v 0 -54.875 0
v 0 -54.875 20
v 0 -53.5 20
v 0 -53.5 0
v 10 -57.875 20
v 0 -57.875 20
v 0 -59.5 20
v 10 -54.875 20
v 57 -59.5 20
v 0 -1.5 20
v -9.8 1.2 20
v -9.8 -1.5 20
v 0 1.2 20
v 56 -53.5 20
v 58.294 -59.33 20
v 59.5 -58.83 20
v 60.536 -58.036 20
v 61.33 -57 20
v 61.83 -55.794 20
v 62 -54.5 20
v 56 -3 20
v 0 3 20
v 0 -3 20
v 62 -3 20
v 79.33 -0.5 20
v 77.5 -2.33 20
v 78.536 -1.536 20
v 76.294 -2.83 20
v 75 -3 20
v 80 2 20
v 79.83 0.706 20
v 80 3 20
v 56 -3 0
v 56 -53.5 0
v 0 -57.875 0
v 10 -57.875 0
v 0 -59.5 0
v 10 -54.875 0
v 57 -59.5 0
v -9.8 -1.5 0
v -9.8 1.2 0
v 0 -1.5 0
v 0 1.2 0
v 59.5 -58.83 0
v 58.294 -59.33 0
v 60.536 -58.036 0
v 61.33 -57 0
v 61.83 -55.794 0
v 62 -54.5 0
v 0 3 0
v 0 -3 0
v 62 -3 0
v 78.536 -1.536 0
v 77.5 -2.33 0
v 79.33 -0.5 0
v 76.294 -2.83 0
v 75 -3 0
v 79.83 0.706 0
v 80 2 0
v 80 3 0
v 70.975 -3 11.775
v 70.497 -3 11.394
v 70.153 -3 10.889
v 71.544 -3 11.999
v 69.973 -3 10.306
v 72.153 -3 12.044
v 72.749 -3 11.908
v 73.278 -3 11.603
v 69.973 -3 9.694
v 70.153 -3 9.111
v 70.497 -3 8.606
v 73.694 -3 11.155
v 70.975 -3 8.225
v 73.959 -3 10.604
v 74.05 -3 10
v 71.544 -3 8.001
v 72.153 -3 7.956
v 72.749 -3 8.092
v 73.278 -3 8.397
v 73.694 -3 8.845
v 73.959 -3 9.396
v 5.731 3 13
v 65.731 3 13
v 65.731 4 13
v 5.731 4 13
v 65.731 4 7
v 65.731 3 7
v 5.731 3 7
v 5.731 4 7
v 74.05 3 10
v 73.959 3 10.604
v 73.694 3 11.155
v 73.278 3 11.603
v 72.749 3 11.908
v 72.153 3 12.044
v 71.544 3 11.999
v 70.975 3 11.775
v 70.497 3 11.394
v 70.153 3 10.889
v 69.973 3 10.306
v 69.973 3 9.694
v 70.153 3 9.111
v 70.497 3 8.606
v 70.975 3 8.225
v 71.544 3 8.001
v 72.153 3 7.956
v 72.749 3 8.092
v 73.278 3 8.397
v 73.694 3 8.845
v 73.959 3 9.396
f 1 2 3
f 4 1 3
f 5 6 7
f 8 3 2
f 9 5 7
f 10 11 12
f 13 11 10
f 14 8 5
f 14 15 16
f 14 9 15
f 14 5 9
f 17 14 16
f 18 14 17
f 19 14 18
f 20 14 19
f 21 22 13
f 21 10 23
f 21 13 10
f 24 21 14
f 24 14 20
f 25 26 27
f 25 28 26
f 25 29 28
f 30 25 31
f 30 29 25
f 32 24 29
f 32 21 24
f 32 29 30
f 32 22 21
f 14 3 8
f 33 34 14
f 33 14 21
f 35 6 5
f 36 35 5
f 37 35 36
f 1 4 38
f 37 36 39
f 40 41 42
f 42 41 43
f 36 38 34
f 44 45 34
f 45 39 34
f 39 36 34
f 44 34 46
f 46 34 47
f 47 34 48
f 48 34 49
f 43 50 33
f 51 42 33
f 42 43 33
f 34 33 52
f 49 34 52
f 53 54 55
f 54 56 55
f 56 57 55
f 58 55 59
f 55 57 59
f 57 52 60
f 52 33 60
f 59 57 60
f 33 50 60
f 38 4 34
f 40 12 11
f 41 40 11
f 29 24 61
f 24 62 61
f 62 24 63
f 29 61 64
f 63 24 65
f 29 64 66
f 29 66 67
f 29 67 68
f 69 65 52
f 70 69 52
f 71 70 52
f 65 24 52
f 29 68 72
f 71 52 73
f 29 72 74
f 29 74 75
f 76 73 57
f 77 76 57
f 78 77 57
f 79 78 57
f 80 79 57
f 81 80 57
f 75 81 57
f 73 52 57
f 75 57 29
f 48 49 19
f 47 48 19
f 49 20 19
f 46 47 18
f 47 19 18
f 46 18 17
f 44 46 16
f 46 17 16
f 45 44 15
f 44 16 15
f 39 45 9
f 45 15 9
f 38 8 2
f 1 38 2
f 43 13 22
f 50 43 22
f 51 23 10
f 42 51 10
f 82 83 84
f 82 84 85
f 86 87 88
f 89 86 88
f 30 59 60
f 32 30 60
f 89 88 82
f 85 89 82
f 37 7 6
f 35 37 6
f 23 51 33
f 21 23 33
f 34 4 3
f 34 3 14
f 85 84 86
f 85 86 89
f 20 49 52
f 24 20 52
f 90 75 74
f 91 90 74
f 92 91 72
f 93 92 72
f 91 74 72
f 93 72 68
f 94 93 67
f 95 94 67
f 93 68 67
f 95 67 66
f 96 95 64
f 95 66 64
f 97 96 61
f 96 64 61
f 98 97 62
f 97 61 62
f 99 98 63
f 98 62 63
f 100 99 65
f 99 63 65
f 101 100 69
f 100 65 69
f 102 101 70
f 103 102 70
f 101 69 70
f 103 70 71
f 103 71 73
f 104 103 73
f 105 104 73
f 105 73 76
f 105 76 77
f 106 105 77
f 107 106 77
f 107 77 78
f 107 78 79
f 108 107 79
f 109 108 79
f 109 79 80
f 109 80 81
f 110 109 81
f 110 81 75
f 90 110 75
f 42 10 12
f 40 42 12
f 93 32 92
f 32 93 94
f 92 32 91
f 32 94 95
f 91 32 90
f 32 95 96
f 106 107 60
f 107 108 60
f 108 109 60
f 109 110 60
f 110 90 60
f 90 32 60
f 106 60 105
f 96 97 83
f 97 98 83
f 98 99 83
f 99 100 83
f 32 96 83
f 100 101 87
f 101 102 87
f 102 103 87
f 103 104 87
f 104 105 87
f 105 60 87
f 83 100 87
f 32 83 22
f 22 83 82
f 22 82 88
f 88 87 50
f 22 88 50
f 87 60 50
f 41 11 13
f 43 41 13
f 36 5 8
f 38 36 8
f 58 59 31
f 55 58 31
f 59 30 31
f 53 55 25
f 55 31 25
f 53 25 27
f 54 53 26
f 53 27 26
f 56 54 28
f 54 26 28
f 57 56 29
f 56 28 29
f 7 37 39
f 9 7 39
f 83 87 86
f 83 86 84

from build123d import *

# Parameters (mm, degrees)
F0_W     = 112
F0_H     = 50.5
F1_DEPTH = 20
F2_R     = 5
F4_D     = 4.1
F6_DEPTH = 20
F7_W     = 60
F7_H     = 6
F8_DEPTH = 1


with BuildPart() as f1:
    # F0 (on Top) → F1 (new body)
    with BuildSketch(Plane.XY):
        Polygon((80, 3), (-80, 3), (-80, -3), (-62, -3), (-62, -59.5), (62, -59.5), (62, -3), (80, -3), align=None)
        with Locations((0, -28.25)):
            Rectangle(F0_W, F0_H, mode=Mode.SUBTRACT)
    extrude(amount=F1_DEPTH)

    # F2
    f2_edges = [f1.edges().sort_by_distance(p)[0] for p in [
        (62, -59.5, 10),
        (-62, -59.5, 10),
        (-80, -3, 10),
        (80, -3, 10),
    ]]
    fillet(f2_edges, radius=F2_R)

    # F4 (through all)
    with Locations(Plane(origin=(0, 3, 0), x_dir=(-1, 0, 0), z_dir=(0, 1, 0))):
        with Locations((-72, 10), (72, 10)):
            Hole(F4_D / 2)

    # F5 (on face) → F6 (cut, through all)
    with BuildSketch(Plane.XY.offset(20)):
        with BuildLine():
            Line((10, -57.87533), (10, -54.87533))
            Line((10, -54.87533), (0, -54.87533))
            Line((0, -54.87533), (0, -53.5))
            Line((0, -53.5), (-56, -53.5))
            Line((-56, -53.5), (-56, -3))
            Line((-56, -3), (0, -3))
            Line((0, -3), (0, -1.5))
            Line((0, -1.5), (-9.8, -1.5))
            Line((-9.8, -1.5), (-9.8, 1.2))
            Line((-9.8, 1.2), (0, 1.2))
            Line((0, 1.2), (0, 3))
            Line((0, 3), (-80, 3))
            Line((-80, 3), (-80, 2))
            ThreePointArc((-80, 2), (-78.535534, -1.535534), (-75, -3))
            Line((-75, -3), (-62, -3))
            Line((-62, -3), (-62, -54.5))
            ThreePointArc((-62, -54.5), (-60.535534, -58.035534), (-57, -59.5))
            Line((-57, -59.5), (0, -59.5))
            Line((0, -59.5), (0, -57.87533))
            Line((0, -57.87533), (10, -57.87533))
        make_face()
    extrude(amount=-F6_DEPTH, mode=Mode.SUBTRACT)

    # F7 (on face) → F8 (join)
    with BuildSketch(Plane(origin=(0, 3, 0), x_dir=(-1, 0, 0), z_dir=(0, 1, 0))):
        with Locations((-35.730945, 10)):
            Rectangle(F7_W, F7_H)
    extrude(amount=F8_DEPTH)


solid = f1.part
